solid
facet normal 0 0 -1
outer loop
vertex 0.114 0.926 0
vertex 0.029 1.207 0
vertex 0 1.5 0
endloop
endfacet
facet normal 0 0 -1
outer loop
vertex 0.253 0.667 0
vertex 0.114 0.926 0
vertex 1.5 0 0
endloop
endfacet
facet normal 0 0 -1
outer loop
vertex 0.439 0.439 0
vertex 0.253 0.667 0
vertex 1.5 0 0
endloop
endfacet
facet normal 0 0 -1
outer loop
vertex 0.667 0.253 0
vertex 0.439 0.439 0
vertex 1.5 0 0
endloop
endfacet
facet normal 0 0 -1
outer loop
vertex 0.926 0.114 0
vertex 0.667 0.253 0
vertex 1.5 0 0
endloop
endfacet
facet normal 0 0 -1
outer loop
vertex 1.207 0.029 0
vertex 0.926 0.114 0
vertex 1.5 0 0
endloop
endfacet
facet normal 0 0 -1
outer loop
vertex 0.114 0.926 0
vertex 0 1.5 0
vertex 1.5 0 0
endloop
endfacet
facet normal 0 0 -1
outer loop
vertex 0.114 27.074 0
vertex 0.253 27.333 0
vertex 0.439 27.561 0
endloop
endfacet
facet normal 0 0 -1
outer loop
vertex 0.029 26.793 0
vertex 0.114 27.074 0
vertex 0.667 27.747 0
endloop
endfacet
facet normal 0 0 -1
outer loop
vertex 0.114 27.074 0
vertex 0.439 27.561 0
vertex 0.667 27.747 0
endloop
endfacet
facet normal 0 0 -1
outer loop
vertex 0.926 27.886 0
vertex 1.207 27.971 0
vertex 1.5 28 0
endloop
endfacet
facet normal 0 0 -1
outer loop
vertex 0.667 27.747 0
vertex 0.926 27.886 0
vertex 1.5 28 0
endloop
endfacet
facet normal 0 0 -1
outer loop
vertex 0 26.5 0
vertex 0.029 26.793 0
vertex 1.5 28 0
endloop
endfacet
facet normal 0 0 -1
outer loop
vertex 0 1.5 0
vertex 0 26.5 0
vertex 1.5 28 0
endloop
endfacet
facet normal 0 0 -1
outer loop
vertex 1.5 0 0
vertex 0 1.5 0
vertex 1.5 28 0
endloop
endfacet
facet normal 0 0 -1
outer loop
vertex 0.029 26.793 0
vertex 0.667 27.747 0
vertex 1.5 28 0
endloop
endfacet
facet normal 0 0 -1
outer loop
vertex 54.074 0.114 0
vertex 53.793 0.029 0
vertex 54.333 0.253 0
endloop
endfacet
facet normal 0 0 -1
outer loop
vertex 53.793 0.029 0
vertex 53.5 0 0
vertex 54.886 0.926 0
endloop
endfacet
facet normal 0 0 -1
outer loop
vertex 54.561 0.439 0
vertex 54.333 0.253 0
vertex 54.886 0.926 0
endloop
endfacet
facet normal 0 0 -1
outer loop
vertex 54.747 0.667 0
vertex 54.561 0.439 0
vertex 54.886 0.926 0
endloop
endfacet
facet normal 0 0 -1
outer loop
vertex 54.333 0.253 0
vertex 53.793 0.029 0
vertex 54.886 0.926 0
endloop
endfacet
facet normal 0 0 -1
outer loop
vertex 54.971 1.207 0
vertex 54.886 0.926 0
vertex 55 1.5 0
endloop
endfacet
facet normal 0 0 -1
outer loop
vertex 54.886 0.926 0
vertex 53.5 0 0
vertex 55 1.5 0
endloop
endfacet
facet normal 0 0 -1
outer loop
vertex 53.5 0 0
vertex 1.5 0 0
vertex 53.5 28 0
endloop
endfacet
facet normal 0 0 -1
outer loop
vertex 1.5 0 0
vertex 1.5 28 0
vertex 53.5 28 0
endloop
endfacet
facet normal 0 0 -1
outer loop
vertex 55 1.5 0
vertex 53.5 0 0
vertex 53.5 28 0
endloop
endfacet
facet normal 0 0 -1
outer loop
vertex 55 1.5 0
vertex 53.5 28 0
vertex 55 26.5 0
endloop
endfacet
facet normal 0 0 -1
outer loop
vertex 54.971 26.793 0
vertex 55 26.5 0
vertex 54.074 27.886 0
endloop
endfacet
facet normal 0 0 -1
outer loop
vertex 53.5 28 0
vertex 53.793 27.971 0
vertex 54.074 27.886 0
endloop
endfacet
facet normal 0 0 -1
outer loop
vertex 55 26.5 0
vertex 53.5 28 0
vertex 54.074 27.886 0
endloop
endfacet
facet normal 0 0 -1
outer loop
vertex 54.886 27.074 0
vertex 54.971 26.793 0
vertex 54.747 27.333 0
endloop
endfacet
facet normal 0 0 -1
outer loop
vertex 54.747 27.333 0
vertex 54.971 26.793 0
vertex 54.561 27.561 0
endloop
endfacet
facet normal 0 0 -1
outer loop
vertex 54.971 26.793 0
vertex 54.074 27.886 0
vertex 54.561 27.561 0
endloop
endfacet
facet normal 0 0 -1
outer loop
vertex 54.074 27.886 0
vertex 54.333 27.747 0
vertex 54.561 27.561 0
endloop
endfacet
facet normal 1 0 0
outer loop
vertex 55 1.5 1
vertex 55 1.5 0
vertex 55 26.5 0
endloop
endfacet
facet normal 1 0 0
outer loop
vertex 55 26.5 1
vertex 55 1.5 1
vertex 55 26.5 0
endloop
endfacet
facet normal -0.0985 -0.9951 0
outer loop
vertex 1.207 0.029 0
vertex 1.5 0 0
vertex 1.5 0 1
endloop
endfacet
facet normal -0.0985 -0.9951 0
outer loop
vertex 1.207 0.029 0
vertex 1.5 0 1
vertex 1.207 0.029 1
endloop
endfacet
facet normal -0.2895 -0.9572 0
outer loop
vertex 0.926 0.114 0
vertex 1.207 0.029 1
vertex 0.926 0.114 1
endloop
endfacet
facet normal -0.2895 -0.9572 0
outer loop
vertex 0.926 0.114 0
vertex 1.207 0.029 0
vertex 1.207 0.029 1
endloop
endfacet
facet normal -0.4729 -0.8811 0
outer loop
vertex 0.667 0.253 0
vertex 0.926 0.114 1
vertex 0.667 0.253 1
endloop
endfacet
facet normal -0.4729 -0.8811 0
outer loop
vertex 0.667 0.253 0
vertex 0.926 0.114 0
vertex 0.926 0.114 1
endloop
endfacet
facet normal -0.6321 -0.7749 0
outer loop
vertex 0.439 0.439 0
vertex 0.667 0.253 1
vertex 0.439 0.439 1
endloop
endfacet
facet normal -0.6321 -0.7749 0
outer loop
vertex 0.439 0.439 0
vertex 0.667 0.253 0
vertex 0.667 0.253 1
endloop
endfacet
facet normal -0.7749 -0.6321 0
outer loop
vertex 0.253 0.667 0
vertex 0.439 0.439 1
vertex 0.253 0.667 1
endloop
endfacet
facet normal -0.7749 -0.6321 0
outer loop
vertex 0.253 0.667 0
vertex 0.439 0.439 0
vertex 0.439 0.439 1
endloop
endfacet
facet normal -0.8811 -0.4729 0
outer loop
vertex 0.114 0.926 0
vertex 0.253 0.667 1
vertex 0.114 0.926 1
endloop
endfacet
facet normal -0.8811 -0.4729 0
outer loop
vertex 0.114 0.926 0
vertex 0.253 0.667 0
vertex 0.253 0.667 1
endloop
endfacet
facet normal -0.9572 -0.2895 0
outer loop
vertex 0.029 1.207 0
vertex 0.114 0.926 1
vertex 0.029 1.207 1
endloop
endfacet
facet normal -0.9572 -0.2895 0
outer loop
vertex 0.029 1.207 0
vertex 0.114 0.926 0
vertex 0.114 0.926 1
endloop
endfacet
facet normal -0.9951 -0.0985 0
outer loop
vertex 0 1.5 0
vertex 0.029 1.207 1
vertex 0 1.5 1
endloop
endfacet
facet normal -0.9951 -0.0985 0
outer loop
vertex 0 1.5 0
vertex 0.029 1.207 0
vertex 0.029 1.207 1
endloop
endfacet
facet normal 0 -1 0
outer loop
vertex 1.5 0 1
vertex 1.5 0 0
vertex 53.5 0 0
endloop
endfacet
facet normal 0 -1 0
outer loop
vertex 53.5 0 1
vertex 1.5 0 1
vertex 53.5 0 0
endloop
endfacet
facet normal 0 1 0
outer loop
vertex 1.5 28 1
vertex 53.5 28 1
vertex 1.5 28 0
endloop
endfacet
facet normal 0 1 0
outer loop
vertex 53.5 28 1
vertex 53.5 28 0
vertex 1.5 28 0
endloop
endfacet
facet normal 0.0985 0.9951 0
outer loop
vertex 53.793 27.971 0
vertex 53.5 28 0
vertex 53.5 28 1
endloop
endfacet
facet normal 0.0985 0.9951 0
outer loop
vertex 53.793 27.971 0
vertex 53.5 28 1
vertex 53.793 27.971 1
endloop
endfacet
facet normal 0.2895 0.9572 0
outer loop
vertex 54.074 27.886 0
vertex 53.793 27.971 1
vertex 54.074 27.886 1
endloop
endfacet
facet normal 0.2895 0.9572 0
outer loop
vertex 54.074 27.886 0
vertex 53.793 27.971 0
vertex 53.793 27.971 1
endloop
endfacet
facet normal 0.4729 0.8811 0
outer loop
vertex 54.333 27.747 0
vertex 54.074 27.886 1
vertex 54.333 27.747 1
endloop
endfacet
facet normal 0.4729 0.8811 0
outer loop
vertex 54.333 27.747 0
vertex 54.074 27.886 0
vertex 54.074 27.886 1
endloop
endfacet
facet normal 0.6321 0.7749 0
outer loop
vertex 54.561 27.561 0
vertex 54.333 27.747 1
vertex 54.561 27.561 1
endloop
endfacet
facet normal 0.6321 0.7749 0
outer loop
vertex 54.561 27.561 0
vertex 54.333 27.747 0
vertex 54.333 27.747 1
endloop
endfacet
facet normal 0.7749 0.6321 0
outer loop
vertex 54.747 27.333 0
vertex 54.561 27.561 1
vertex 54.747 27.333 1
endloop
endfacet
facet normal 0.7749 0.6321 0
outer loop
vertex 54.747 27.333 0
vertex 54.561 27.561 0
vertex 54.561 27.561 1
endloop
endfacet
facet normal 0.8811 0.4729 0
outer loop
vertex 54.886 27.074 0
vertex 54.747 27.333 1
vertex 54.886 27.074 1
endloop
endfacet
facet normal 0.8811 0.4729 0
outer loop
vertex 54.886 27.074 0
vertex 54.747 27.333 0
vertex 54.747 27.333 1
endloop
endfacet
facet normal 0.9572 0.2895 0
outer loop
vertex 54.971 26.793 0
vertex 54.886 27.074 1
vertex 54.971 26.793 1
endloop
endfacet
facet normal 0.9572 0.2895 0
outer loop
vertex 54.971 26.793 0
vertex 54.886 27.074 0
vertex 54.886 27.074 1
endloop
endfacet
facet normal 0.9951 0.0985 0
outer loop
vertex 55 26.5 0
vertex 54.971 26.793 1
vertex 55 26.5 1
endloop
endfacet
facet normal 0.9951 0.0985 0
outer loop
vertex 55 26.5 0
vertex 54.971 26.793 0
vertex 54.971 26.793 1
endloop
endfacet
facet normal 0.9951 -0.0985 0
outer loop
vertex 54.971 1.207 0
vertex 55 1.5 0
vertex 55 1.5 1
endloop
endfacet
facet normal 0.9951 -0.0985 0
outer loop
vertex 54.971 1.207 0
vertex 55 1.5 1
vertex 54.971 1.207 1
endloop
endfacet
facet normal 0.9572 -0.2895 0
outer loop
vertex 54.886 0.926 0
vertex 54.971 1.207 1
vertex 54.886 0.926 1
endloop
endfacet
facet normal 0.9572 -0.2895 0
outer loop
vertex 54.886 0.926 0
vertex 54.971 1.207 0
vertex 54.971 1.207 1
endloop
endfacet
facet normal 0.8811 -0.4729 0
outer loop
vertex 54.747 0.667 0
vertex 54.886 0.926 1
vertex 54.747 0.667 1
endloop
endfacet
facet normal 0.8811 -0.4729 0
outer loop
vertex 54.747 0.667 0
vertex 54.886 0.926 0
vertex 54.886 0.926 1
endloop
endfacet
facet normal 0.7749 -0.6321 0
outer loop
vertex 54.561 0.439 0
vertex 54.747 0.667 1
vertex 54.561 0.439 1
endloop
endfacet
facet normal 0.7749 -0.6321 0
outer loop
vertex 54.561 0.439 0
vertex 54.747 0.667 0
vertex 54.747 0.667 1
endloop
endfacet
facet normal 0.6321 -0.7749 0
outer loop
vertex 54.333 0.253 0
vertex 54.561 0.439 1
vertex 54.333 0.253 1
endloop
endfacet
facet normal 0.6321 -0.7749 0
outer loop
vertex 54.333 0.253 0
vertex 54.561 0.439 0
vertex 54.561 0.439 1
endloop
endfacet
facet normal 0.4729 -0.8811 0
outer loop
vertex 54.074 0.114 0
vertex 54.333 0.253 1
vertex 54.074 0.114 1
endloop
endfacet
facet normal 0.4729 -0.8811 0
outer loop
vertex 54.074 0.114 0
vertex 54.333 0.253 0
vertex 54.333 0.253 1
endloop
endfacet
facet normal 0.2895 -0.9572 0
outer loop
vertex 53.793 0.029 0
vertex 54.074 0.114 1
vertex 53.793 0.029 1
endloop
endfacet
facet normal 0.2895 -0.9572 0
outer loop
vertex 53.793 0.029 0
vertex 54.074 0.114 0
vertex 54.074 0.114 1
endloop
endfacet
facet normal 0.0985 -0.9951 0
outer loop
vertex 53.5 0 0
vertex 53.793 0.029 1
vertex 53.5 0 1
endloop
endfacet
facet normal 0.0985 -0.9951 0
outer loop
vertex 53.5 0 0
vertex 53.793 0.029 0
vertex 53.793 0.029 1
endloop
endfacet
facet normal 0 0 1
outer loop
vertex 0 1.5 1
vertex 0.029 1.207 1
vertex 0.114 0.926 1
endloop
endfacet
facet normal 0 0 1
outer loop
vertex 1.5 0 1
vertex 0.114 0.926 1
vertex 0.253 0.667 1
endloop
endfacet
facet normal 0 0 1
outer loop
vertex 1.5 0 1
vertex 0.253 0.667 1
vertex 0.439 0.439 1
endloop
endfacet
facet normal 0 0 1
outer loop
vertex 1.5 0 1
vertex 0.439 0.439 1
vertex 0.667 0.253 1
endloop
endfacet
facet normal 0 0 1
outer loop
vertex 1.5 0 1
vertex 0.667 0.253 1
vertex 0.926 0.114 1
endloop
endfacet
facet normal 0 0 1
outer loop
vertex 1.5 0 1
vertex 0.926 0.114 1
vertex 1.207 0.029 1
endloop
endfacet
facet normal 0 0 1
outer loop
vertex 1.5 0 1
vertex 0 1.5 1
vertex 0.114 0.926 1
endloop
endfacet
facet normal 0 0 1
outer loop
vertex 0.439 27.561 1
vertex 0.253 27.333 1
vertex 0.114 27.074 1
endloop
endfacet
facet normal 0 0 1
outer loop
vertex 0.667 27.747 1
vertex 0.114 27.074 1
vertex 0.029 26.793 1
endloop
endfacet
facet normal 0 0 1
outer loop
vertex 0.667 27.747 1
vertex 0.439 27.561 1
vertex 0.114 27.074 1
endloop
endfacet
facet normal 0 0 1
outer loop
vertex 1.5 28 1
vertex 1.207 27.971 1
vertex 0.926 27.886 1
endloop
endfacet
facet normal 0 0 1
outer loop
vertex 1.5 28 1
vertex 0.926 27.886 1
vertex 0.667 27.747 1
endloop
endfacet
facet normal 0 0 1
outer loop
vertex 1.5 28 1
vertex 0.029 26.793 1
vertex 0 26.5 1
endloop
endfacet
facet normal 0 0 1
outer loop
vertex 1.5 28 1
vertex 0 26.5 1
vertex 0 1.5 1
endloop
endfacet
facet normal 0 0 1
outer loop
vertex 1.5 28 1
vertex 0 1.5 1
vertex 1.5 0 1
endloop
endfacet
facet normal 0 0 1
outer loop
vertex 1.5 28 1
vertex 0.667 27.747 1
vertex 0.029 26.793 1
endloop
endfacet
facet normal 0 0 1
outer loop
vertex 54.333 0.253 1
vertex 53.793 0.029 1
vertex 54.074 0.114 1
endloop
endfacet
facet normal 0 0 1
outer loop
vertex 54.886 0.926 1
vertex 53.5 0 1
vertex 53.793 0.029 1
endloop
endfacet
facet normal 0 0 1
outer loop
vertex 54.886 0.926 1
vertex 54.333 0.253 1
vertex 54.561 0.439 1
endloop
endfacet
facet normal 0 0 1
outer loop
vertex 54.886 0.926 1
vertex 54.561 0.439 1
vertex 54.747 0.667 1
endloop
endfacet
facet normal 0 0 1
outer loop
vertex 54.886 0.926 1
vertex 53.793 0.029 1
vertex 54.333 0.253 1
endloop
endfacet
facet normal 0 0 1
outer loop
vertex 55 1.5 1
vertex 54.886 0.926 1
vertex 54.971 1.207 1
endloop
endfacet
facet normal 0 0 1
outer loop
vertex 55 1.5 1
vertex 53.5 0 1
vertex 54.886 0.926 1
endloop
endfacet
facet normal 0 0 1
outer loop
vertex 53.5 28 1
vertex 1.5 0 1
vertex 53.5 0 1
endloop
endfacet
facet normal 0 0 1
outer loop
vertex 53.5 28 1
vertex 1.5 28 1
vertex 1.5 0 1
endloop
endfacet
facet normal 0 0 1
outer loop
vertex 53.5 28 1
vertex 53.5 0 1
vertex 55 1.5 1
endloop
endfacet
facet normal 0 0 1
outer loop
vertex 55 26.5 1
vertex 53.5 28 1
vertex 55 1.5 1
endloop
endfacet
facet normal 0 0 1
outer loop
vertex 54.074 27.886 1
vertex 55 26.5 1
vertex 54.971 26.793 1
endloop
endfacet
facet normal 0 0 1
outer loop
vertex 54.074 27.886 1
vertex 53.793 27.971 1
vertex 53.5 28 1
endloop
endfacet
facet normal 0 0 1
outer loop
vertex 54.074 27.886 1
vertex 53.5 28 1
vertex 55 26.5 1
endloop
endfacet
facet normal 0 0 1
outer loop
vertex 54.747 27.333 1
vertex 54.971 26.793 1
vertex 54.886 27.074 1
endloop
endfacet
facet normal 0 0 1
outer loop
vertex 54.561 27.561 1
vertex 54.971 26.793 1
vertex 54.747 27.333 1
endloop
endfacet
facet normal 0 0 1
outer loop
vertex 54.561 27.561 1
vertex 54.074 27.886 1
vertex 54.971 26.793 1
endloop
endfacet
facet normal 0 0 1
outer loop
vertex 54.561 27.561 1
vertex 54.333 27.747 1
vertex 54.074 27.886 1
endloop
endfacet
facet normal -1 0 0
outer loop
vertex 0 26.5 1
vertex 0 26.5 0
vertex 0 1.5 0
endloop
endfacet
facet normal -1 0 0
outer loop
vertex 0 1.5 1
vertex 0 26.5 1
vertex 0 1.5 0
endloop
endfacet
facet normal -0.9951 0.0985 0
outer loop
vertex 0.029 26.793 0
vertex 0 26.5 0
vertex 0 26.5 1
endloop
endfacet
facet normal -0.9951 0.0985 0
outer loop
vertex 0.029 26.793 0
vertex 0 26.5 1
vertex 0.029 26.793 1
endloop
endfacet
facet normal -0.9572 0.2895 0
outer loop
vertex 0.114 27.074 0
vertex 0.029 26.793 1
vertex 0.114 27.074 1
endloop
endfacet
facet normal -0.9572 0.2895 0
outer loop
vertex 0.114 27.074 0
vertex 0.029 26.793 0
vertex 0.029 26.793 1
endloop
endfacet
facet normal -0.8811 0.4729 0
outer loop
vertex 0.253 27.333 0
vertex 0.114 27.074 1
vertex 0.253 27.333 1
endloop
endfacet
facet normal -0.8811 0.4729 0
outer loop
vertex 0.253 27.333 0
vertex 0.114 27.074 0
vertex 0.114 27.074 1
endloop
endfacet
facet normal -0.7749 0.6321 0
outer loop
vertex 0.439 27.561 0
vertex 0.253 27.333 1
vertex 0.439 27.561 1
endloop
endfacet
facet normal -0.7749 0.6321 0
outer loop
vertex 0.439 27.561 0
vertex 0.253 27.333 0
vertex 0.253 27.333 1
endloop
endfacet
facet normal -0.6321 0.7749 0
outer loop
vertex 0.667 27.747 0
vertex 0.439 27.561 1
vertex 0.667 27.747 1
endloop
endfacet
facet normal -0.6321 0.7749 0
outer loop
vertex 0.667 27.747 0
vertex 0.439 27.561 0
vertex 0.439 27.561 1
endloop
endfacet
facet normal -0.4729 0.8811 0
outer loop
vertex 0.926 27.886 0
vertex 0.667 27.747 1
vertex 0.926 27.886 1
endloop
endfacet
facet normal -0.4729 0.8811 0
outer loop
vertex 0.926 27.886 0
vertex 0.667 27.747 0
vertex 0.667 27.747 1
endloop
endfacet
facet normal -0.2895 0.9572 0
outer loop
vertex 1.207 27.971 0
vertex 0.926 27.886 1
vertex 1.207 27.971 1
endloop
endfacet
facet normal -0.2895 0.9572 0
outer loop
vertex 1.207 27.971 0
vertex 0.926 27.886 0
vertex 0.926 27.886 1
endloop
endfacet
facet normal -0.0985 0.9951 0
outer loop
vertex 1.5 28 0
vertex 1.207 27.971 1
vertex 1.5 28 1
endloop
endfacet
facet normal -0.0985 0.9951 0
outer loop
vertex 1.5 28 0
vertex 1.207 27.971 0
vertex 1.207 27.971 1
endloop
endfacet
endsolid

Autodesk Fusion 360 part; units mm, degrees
sketch "Sketch1" plane through (0, 0, 0) normal (0, 0, 1) x (1, 0, 0)
  line L0 (1.5, 0) -> (53.5, 0)
  line L1 (55, 1.5) -> (55, 26.5)
  line L2 (53.5, 28) -> (1.5, 28)
  line L3 (0, 26.5) -> (0, 1.5)
  arc A0 (55, 26.5) -> (53.5, 28) centre (53.5, 26.5) ccw
  arc A1 (53.5, 0) -> (55, 1.5) centre (53.5, 1.5) ccw
  arc A2 (1.5, 28) -> (0, 26.5) centre (1.5, 26.5) ccw
  arc A3 (0, 1.5) -> (1.5, 0) centre (1.5, 1.5) ccw
  point P0 (55, 28)
  point P1 (0, 28)
  dimension "d1" = 28
  dimension "d2" = 55
  dimension "d3" = 1.5
  dimension "d4" = 1.5
  dimension "d5" = 1.5
  dimension "d6" = 1.5
extrude "Extrude1" add sketch "Sketch1" along normal blind 1
